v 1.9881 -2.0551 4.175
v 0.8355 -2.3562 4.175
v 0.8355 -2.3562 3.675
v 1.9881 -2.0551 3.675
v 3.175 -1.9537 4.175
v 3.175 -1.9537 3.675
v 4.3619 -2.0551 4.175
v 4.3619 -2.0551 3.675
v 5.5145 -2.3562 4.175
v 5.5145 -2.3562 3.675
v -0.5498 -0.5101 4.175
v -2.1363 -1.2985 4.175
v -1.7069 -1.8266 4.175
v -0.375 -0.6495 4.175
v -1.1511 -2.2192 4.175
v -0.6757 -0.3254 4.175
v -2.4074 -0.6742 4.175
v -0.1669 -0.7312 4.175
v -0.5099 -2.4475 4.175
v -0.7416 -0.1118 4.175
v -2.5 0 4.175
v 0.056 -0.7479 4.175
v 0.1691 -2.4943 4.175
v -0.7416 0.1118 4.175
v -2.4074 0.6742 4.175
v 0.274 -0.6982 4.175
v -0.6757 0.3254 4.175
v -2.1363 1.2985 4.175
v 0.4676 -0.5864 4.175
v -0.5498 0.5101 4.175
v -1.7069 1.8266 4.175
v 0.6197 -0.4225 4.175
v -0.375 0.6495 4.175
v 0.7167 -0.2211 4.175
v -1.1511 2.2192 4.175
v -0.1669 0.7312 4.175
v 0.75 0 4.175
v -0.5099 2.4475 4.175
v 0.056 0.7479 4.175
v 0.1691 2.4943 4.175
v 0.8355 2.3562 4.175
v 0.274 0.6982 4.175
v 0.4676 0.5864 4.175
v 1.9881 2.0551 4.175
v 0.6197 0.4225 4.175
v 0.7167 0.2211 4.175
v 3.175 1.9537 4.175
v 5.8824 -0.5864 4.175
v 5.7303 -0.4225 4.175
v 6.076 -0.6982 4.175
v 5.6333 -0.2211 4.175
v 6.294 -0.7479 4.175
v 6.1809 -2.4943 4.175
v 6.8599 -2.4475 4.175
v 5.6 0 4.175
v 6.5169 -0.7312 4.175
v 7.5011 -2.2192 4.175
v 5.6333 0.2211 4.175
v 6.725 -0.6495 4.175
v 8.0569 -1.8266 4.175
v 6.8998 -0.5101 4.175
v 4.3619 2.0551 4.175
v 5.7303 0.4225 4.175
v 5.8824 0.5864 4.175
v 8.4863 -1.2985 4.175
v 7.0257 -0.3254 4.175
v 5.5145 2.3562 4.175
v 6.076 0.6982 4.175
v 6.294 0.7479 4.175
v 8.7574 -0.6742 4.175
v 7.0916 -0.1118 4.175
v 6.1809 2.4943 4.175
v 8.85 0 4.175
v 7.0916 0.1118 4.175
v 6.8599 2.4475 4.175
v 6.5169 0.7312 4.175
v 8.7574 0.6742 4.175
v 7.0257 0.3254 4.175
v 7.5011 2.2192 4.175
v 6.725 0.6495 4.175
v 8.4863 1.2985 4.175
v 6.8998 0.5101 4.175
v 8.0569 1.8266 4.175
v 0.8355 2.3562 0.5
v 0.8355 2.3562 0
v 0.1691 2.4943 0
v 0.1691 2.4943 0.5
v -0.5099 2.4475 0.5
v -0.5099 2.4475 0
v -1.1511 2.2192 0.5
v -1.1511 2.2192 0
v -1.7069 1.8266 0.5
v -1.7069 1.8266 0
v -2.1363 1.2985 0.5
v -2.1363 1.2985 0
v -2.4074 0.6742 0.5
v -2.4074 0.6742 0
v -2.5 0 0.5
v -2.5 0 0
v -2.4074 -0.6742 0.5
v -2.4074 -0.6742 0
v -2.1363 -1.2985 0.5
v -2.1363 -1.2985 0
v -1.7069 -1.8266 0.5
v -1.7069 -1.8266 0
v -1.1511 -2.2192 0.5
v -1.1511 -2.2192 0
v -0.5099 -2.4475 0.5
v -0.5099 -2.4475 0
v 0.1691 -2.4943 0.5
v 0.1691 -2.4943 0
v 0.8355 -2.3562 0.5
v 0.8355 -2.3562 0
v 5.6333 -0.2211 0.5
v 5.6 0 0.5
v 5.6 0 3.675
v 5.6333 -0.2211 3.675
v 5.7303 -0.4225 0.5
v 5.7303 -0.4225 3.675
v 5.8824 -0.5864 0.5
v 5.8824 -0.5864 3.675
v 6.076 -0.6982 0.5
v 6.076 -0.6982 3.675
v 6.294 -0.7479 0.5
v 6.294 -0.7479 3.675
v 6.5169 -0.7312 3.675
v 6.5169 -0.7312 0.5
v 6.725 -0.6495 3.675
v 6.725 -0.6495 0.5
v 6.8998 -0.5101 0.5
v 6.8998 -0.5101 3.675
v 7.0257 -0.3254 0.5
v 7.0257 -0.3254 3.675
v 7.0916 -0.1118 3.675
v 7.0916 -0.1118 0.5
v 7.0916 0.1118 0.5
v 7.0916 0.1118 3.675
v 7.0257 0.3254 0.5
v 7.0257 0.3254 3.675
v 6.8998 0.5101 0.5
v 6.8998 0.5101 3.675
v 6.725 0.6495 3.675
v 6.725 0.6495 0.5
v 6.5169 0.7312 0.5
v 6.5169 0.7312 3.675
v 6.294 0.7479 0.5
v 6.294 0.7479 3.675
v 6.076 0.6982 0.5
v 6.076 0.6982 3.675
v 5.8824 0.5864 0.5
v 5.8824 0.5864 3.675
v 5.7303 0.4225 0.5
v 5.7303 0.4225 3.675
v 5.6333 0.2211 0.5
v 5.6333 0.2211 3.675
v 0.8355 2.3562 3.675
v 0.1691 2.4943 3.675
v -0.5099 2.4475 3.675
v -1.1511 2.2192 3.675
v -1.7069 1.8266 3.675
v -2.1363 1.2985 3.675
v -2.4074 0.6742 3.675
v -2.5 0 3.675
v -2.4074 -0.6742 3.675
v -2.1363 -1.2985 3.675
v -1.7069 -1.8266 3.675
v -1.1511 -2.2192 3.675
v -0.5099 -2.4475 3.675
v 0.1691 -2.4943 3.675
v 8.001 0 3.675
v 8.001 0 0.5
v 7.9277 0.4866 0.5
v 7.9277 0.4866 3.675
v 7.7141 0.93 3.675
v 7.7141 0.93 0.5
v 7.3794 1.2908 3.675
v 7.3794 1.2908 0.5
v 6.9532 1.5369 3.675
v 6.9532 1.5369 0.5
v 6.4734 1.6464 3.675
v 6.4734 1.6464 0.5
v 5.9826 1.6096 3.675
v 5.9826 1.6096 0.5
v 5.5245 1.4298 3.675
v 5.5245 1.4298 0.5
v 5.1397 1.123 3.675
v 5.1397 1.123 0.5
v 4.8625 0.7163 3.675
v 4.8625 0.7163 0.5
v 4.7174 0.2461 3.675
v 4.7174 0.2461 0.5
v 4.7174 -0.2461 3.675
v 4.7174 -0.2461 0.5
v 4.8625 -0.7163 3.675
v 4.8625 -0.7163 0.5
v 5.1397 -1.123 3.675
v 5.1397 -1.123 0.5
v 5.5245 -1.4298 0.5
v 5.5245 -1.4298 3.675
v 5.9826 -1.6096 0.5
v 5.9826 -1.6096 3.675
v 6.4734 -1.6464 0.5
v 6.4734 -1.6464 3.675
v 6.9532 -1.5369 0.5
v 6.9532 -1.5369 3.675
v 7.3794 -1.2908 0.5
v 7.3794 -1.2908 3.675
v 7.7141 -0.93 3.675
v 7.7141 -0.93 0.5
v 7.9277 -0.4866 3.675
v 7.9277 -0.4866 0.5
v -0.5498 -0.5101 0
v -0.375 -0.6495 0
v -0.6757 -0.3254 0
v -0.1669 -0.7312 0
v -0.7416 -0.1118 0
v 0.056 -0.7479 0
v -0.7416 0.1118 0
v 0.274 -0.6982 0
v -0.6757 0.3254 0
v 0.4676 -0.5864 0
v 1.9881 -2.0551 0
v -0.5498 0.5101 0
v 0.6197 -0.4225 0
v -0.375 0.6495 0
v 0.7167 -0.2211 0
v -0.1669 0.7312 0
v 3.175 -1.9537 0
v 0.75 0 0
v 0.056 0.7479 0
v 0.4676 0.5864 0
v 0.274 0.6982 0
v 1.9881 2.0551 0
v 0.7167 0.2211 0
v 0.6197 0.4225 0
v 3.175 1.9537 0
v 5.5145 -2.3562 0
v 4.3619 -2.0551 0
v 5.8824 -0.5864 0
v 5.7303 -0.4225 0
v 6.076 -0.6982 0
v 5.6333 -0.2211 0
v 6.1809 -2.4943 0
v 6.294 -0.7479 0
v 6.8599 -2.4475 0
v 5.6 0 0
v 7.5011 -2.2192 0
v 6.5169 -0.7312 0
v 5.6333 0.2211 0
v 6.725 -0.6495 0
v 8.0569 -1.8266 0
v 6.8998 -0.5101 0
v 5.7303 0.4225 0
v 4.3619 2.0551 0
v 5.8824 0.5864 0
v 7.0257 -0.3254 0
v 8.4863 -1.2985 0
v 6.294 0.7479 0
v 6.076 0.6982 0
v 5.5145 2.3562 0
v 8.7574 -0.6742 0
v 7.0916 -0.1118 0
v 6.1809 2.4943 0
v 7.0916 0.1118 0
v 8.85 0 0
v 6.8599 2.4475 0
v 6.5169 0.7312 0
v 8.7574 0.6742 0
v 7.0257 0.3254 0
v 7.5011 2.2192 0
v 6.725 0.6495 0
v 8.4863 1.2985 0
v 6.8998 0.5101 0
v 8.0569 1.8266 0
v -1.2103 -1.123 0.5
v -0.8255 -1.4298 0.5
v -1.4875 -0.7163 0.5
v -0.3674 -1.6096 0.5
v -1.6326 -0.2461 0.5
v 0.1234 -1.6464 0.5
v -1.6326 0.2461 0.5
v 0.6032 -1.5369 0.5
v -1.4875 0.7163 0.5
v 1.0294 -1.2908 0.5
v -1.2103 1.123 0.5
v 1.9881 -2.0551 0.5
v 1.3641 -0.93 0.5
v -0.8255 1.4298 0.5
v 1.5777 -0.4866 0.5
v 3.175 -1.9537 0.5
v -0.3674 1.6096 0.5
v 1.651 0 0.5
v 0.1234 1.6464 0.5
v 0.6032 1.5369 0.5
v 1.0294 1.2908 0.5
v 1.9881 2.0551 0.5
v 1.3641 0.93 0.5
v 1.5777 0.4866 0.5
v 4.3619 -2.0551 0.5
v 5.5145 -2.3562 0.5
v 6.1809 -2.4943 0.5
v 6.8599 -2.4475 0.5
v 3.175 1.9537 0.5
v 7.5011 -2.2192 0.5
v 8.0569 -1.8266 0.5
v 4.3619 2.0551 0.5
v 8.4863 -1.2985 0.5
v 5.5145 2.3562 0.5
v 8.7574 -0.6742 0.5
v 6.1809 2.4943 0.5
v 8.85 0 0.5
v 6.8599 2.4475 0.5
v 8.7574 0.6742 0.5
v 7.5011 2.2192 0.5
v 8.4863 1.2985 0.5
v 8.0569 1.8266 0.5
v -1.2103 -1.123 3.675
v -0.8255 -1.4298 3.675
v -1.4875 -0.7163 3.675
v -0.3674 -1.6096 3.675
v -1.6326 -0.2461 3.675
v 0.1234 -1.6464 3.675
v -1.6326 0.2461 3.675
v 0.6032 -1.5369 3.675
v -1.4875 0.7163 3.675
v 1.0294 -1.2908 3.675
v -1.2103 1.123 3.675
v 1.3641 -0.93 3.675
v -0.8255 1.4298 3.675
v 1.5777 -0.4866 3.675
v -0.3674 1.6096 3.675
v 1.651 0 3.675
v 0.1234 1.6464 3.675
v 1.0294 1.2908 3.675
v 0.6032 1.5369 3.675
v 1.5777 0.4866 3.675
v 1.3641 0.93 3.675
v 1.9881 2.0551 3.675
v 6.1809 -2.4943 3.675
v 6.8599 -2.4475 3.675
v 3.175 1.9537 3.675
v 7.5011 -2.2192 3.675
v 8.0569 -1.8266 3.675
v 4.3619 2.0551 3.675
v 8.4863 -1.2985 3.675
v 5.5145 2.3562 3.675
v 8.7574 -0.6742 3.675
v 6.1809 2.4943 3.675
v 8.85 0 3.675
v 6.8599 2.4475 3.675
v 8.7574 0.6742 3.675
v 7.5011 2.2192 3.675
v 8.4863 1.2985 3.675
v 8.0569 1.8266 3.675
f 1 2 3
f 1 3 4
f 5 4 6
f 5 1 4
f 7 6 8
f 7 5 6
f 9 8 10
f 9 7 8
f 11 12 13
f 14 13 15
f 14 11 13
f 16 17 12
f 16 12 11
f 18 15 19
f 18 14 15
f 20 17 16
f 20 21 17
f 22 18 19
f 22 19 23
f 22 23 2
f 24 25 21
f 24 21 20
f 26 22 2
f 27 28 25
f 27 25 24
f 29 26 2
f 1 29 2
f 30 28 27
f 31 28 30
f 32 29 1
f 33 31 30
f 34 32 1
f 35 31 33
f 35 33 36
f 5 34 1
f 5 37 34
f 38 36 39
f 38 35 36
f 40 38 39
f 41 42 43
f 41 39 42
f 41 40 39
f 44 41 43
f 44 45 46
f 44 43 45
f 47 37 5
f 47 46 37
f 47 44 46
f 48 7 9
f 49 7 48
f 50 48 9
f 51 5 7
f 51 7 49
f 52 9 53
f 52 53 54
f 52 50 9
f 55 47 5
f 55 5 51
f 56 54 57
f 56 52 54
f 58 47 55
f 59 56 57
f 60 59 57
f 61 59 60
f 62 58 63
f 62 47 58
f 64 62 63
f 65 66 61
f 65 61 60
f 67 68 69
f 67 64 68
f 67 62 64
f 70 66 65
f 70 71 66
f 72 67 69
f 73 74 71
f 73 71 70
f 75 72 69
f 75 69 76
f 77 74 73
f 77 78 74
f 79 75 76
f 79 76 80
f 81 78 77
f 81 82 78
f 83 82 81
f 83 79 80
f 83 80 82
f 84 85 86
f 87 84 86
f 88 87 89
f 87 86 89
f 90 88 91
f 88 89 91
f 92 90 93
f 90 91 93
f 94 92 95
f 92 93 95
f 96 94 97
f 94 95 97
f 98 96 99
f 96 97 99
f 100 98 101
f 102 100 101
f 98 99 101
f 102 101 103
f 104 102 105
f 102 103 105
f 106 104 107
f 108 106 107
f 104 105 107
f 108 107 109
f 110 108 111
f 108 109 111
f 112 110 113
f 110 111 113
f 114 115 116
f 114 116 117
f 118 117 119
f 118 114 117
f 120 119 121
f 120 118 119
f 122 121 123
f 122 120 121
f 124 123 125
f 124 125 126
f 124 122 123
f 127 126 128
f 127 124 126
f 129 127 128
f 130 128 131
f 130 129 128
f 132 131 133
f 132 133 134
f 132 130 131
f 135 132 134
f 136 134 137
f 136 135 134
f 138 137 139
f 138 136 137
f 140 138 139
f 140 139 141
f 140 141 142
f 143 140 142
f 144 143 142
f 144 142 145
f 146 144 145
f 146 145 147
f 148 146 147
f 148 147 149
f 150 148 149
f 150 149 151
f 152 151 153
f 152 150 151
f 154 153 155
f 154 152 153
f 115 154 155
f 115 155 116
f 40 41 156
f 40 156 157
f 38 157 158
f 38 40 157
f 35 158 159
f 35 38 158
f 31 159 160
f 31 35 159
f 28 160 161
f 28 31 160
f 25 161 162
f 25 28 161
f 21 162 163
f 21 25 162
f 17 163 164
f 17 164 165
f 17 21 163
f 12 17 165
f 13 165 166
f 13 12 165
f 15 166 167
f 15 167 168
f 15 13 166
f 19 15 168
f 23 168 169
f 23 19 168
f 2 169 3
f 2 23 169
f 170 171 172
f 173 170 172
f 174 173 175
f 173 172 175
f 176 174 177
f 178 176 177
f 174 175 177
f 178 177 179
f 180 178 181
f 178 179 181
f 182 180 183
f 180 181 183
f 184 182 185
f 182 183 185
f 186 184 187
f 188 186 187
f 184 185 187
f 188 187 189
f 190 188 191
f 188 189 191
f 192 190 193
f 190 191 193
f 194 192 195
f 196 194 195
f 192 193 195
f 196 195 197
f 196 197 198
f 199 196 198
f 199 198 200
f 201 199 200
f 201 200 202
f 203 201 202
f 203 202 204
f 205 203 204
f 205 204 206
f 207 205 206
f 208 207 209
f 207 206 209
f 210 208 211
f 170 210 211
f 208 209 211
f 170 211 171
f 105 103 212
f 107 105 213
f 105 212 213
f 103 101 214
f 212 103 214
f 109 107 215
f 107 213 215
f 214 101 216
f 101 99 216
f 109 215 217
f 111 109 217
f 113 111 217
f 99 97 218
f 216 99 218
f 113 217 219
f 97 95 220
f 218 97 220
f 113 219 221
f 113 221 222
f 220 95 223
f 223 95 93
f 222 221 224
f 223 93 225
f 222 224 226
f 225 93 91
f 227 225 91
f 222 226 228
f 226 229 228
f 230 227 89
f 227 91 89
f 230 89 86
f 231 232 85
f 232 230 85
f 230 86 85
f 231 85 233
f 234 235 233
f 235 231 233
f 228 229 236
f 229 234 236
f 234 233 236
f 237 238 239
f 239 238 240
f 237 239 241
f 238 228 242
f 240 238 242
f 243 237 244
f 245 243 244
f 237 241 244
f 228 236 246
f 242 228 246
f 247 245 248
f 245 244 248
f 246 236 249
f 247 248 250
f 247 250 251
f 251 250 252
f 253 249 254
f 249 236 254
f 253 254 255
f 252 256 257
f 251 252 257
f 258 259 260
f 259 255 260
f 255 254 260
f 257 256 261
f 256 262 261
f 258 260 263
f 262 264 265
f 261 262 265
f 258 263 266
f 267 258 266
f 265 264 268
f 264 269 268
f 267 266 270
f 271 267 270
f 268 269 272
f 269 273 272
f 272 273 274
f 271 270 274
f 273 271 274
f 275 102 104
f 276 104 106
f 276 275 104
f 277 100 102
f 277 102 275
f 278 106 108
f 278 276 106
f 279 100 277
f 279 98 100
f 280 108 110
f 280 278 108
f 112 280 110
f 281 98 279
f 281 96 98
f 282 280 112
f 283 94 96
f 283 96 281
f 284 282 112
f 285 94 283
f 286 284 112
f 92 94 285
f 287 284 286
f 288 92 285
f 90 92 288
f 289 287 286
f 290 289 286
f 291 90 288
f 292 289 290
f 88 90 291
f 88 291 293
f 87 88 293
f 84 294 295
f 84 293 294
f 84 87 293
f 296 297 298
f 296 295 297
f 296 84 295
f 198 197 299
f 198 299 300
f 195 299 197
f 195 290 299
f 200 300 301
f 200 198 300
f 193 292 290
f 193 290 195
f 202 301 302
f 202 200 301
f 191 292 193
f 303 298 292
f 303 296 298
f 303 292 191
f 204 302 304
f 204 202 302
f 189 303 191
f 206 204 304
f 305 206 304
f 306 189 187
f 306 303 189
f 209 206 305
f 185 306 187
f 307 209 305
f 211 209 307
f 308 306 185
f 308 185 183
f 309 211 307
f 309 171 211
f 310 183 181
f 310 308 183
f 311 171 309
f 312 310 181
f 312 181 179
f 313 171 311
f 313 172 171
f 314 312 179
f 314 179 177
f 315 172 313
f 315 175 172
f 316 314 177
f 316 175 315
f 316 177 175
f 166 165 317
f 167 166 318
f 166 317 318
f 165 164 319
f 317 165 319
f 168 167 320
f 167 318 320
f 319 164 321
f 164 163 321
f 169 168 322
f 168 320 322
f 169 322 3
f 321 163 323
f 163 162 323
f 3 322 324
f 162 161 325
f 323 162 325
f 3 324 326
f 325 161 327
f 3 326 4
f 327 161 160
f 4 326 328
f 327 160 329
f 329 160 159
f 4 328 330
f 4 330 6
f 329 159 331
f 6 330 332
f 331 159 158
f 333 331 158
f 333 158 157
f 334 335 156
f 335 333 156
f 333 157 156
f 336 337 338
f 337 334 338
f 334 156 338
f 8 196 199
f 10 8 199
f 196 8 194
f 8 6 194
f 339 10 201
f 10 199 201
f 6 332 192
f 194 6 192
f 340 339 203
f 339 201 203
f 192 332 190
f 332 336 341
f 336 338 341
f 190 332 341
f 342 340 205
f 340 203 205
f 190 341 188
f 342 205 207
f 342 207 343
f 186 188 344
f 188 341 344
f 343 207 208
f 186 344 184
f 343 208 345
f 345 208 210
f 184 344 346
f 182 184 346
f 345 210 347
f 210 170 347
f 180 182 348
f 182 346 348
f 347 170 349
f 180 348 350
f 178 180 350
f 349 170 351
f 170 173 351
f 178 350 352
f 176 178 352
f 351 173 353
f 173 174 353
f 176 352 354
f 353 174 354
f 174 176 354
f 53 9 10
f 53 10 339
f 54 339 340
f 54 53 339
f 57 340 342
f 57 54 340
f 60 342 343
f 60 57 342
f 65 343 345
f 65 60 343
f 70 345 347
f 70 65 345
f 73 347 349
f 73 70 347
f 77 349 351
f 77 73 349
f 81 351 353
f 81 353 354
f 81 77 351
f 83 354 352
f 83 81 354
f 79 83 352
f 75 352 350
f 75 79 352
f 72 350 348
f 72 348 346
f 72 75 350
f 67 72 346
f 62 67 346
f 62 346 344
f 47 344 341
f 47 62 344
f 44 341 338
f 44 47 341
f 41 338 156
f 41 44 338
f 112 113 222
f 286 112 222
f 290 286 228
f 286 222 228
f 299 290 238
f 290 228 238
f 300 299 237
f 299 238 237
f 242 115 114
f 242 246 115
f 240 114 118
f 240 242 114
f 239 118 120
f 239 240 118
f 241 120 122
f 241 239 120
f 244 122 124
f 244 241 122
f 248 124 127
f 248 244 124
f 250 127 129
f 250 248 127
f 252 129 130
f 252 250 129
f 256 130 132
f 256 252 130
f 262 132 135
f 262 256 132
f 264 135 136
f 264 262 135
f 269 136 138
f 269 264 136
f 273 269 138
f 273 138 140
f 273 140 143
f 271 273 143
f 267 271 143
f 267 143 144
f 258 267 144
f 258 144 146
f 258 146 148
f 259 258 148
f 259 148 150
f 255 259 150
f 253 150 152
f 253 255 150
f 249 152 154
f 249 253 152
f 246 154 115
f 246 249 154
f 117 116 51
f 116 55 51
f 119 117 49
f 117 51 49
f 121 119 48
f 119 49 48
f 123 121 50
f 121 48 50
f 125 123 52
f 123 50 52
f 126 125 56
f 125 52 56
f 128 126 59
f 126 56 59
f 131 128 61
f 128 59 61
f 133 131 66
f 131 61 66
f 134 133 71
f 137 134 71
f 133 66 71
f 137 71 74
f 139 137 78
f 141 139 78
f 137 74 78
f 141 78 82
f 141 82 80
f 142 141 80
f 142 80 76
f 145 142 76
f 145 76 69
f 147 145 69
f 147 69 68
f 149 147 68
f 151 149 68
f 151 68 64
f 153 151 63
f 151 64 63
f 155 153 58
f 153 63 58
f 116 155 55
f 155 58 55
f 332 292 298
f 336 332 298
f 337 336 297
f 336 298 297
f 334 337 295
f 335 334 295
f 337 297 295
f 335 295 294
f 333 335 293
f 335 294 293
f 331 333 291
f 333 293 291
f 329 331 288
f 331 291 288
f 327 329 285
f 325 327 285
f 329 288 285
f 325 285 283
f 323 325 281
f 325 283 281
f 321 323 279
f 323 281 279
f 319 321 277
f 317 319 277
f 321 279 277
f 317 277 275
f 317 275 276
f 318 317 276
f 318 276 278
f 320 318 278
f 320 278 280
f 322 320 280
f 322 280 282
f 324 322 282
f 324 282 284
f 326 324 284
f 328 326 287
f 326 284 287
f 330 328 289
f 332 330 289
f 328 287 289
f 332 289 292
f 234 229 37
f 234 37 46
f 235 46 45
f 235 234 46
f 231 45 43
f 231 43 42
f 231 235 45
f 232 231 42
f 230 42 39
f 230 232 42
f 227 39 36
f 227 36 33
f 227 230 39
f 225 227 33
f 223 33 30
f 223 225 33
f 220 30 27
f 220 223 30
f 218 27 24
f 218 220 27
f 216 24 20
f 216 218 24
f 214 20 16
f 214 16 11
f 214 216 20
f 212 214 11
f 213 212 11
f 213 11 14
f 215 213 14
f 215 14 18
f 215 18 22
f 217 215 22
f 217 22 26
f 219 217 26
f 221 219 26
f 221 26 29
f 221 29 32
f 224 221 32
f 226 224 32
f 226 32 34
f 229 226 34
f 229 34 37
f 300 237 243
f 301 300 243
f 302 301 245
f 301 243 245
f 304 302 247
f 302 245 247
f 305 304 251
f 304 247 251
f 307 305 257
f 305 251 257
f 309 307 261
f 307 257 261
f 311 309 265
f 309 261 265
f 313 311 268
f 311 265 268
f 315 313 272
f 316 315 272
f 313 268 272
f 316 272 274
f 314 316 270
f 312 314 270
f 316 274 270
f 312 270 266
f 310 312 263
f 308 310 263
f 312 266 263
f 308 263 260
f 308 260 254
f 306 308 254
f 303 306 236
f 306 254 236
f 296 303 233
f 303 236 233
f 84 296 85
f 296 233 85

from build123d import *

# Parameters (mm, degrees)
SKETCH1_R           = 0.75
BOSS_EXTRUDE1_DEPTH = 0.5
SKETCH2_R           = 1.651
SKETCH2_R_2         = 0.75
BOSS_EXTRUDE2_DEPTH = 3.175


with BuildPart() as part:
    # Sketch1 → Boss-Extrude1 (new body)
    with BuildSketch(Plane.XY):
        with BuildLine():
            ThreePointArc((0.835526316, 2.356246119), (-2.5, 0), (0.835526316, -2.356246119))
            ThreePointArc((0.835526316, -2.356246119), (3.175, -1.953735254), (5.514473684, -2.356246119))
            ThreePointArc((5.514473684, -2.356246119), (8.85, 0), (5.514473684, 2.356246119))
            ThreePointArc((5.514473684, 2.356246119), (3.175, 1.953735254), (0.835526316, 2.356246119))
        make_face()
        Circle(SKETCH1_R, mode=Mode.SUBTRACT)
        with Locations(Location((6.35, 0, 0), (0, 0, 180))):
            Circle(SKETCH1_R, mode=Mode.SUBTRACT)
    extrude(amount=BOSS_EXTRUDE1_DEPTH)

    # Sketch2 → Boss-Extrude2 (add)
    # profile 1 of 2: a face of its own
    with BuildSketch(Plane.XY.offset(0.5)):
        with Locations((6.35, 0)):
            Circle(SKETCH2_R)
        with Locations(Location((6.35, 0, 0), (0, 0, 180))):
            Circle(SKETCH2_R_2, mode=Mode.SUBTRACT)
    # profile 2 of 2: a face of its own
    with BuildSketch(Plane.XY.offset(0.5)):
        Circle(SKETCH2_R)
        Circle(SKETCH2_R_2, mode=Mode.SUBTRACT)
    extrude(amount=BOSS_EXTRUDE2_DEPTH)

    # Mirror1: part across plane


with BuildPart() as part_1:
    add(part.part)
    add(part.part.mirror(Plane.XY.offset(2.0875)))


solid = part_1.part
